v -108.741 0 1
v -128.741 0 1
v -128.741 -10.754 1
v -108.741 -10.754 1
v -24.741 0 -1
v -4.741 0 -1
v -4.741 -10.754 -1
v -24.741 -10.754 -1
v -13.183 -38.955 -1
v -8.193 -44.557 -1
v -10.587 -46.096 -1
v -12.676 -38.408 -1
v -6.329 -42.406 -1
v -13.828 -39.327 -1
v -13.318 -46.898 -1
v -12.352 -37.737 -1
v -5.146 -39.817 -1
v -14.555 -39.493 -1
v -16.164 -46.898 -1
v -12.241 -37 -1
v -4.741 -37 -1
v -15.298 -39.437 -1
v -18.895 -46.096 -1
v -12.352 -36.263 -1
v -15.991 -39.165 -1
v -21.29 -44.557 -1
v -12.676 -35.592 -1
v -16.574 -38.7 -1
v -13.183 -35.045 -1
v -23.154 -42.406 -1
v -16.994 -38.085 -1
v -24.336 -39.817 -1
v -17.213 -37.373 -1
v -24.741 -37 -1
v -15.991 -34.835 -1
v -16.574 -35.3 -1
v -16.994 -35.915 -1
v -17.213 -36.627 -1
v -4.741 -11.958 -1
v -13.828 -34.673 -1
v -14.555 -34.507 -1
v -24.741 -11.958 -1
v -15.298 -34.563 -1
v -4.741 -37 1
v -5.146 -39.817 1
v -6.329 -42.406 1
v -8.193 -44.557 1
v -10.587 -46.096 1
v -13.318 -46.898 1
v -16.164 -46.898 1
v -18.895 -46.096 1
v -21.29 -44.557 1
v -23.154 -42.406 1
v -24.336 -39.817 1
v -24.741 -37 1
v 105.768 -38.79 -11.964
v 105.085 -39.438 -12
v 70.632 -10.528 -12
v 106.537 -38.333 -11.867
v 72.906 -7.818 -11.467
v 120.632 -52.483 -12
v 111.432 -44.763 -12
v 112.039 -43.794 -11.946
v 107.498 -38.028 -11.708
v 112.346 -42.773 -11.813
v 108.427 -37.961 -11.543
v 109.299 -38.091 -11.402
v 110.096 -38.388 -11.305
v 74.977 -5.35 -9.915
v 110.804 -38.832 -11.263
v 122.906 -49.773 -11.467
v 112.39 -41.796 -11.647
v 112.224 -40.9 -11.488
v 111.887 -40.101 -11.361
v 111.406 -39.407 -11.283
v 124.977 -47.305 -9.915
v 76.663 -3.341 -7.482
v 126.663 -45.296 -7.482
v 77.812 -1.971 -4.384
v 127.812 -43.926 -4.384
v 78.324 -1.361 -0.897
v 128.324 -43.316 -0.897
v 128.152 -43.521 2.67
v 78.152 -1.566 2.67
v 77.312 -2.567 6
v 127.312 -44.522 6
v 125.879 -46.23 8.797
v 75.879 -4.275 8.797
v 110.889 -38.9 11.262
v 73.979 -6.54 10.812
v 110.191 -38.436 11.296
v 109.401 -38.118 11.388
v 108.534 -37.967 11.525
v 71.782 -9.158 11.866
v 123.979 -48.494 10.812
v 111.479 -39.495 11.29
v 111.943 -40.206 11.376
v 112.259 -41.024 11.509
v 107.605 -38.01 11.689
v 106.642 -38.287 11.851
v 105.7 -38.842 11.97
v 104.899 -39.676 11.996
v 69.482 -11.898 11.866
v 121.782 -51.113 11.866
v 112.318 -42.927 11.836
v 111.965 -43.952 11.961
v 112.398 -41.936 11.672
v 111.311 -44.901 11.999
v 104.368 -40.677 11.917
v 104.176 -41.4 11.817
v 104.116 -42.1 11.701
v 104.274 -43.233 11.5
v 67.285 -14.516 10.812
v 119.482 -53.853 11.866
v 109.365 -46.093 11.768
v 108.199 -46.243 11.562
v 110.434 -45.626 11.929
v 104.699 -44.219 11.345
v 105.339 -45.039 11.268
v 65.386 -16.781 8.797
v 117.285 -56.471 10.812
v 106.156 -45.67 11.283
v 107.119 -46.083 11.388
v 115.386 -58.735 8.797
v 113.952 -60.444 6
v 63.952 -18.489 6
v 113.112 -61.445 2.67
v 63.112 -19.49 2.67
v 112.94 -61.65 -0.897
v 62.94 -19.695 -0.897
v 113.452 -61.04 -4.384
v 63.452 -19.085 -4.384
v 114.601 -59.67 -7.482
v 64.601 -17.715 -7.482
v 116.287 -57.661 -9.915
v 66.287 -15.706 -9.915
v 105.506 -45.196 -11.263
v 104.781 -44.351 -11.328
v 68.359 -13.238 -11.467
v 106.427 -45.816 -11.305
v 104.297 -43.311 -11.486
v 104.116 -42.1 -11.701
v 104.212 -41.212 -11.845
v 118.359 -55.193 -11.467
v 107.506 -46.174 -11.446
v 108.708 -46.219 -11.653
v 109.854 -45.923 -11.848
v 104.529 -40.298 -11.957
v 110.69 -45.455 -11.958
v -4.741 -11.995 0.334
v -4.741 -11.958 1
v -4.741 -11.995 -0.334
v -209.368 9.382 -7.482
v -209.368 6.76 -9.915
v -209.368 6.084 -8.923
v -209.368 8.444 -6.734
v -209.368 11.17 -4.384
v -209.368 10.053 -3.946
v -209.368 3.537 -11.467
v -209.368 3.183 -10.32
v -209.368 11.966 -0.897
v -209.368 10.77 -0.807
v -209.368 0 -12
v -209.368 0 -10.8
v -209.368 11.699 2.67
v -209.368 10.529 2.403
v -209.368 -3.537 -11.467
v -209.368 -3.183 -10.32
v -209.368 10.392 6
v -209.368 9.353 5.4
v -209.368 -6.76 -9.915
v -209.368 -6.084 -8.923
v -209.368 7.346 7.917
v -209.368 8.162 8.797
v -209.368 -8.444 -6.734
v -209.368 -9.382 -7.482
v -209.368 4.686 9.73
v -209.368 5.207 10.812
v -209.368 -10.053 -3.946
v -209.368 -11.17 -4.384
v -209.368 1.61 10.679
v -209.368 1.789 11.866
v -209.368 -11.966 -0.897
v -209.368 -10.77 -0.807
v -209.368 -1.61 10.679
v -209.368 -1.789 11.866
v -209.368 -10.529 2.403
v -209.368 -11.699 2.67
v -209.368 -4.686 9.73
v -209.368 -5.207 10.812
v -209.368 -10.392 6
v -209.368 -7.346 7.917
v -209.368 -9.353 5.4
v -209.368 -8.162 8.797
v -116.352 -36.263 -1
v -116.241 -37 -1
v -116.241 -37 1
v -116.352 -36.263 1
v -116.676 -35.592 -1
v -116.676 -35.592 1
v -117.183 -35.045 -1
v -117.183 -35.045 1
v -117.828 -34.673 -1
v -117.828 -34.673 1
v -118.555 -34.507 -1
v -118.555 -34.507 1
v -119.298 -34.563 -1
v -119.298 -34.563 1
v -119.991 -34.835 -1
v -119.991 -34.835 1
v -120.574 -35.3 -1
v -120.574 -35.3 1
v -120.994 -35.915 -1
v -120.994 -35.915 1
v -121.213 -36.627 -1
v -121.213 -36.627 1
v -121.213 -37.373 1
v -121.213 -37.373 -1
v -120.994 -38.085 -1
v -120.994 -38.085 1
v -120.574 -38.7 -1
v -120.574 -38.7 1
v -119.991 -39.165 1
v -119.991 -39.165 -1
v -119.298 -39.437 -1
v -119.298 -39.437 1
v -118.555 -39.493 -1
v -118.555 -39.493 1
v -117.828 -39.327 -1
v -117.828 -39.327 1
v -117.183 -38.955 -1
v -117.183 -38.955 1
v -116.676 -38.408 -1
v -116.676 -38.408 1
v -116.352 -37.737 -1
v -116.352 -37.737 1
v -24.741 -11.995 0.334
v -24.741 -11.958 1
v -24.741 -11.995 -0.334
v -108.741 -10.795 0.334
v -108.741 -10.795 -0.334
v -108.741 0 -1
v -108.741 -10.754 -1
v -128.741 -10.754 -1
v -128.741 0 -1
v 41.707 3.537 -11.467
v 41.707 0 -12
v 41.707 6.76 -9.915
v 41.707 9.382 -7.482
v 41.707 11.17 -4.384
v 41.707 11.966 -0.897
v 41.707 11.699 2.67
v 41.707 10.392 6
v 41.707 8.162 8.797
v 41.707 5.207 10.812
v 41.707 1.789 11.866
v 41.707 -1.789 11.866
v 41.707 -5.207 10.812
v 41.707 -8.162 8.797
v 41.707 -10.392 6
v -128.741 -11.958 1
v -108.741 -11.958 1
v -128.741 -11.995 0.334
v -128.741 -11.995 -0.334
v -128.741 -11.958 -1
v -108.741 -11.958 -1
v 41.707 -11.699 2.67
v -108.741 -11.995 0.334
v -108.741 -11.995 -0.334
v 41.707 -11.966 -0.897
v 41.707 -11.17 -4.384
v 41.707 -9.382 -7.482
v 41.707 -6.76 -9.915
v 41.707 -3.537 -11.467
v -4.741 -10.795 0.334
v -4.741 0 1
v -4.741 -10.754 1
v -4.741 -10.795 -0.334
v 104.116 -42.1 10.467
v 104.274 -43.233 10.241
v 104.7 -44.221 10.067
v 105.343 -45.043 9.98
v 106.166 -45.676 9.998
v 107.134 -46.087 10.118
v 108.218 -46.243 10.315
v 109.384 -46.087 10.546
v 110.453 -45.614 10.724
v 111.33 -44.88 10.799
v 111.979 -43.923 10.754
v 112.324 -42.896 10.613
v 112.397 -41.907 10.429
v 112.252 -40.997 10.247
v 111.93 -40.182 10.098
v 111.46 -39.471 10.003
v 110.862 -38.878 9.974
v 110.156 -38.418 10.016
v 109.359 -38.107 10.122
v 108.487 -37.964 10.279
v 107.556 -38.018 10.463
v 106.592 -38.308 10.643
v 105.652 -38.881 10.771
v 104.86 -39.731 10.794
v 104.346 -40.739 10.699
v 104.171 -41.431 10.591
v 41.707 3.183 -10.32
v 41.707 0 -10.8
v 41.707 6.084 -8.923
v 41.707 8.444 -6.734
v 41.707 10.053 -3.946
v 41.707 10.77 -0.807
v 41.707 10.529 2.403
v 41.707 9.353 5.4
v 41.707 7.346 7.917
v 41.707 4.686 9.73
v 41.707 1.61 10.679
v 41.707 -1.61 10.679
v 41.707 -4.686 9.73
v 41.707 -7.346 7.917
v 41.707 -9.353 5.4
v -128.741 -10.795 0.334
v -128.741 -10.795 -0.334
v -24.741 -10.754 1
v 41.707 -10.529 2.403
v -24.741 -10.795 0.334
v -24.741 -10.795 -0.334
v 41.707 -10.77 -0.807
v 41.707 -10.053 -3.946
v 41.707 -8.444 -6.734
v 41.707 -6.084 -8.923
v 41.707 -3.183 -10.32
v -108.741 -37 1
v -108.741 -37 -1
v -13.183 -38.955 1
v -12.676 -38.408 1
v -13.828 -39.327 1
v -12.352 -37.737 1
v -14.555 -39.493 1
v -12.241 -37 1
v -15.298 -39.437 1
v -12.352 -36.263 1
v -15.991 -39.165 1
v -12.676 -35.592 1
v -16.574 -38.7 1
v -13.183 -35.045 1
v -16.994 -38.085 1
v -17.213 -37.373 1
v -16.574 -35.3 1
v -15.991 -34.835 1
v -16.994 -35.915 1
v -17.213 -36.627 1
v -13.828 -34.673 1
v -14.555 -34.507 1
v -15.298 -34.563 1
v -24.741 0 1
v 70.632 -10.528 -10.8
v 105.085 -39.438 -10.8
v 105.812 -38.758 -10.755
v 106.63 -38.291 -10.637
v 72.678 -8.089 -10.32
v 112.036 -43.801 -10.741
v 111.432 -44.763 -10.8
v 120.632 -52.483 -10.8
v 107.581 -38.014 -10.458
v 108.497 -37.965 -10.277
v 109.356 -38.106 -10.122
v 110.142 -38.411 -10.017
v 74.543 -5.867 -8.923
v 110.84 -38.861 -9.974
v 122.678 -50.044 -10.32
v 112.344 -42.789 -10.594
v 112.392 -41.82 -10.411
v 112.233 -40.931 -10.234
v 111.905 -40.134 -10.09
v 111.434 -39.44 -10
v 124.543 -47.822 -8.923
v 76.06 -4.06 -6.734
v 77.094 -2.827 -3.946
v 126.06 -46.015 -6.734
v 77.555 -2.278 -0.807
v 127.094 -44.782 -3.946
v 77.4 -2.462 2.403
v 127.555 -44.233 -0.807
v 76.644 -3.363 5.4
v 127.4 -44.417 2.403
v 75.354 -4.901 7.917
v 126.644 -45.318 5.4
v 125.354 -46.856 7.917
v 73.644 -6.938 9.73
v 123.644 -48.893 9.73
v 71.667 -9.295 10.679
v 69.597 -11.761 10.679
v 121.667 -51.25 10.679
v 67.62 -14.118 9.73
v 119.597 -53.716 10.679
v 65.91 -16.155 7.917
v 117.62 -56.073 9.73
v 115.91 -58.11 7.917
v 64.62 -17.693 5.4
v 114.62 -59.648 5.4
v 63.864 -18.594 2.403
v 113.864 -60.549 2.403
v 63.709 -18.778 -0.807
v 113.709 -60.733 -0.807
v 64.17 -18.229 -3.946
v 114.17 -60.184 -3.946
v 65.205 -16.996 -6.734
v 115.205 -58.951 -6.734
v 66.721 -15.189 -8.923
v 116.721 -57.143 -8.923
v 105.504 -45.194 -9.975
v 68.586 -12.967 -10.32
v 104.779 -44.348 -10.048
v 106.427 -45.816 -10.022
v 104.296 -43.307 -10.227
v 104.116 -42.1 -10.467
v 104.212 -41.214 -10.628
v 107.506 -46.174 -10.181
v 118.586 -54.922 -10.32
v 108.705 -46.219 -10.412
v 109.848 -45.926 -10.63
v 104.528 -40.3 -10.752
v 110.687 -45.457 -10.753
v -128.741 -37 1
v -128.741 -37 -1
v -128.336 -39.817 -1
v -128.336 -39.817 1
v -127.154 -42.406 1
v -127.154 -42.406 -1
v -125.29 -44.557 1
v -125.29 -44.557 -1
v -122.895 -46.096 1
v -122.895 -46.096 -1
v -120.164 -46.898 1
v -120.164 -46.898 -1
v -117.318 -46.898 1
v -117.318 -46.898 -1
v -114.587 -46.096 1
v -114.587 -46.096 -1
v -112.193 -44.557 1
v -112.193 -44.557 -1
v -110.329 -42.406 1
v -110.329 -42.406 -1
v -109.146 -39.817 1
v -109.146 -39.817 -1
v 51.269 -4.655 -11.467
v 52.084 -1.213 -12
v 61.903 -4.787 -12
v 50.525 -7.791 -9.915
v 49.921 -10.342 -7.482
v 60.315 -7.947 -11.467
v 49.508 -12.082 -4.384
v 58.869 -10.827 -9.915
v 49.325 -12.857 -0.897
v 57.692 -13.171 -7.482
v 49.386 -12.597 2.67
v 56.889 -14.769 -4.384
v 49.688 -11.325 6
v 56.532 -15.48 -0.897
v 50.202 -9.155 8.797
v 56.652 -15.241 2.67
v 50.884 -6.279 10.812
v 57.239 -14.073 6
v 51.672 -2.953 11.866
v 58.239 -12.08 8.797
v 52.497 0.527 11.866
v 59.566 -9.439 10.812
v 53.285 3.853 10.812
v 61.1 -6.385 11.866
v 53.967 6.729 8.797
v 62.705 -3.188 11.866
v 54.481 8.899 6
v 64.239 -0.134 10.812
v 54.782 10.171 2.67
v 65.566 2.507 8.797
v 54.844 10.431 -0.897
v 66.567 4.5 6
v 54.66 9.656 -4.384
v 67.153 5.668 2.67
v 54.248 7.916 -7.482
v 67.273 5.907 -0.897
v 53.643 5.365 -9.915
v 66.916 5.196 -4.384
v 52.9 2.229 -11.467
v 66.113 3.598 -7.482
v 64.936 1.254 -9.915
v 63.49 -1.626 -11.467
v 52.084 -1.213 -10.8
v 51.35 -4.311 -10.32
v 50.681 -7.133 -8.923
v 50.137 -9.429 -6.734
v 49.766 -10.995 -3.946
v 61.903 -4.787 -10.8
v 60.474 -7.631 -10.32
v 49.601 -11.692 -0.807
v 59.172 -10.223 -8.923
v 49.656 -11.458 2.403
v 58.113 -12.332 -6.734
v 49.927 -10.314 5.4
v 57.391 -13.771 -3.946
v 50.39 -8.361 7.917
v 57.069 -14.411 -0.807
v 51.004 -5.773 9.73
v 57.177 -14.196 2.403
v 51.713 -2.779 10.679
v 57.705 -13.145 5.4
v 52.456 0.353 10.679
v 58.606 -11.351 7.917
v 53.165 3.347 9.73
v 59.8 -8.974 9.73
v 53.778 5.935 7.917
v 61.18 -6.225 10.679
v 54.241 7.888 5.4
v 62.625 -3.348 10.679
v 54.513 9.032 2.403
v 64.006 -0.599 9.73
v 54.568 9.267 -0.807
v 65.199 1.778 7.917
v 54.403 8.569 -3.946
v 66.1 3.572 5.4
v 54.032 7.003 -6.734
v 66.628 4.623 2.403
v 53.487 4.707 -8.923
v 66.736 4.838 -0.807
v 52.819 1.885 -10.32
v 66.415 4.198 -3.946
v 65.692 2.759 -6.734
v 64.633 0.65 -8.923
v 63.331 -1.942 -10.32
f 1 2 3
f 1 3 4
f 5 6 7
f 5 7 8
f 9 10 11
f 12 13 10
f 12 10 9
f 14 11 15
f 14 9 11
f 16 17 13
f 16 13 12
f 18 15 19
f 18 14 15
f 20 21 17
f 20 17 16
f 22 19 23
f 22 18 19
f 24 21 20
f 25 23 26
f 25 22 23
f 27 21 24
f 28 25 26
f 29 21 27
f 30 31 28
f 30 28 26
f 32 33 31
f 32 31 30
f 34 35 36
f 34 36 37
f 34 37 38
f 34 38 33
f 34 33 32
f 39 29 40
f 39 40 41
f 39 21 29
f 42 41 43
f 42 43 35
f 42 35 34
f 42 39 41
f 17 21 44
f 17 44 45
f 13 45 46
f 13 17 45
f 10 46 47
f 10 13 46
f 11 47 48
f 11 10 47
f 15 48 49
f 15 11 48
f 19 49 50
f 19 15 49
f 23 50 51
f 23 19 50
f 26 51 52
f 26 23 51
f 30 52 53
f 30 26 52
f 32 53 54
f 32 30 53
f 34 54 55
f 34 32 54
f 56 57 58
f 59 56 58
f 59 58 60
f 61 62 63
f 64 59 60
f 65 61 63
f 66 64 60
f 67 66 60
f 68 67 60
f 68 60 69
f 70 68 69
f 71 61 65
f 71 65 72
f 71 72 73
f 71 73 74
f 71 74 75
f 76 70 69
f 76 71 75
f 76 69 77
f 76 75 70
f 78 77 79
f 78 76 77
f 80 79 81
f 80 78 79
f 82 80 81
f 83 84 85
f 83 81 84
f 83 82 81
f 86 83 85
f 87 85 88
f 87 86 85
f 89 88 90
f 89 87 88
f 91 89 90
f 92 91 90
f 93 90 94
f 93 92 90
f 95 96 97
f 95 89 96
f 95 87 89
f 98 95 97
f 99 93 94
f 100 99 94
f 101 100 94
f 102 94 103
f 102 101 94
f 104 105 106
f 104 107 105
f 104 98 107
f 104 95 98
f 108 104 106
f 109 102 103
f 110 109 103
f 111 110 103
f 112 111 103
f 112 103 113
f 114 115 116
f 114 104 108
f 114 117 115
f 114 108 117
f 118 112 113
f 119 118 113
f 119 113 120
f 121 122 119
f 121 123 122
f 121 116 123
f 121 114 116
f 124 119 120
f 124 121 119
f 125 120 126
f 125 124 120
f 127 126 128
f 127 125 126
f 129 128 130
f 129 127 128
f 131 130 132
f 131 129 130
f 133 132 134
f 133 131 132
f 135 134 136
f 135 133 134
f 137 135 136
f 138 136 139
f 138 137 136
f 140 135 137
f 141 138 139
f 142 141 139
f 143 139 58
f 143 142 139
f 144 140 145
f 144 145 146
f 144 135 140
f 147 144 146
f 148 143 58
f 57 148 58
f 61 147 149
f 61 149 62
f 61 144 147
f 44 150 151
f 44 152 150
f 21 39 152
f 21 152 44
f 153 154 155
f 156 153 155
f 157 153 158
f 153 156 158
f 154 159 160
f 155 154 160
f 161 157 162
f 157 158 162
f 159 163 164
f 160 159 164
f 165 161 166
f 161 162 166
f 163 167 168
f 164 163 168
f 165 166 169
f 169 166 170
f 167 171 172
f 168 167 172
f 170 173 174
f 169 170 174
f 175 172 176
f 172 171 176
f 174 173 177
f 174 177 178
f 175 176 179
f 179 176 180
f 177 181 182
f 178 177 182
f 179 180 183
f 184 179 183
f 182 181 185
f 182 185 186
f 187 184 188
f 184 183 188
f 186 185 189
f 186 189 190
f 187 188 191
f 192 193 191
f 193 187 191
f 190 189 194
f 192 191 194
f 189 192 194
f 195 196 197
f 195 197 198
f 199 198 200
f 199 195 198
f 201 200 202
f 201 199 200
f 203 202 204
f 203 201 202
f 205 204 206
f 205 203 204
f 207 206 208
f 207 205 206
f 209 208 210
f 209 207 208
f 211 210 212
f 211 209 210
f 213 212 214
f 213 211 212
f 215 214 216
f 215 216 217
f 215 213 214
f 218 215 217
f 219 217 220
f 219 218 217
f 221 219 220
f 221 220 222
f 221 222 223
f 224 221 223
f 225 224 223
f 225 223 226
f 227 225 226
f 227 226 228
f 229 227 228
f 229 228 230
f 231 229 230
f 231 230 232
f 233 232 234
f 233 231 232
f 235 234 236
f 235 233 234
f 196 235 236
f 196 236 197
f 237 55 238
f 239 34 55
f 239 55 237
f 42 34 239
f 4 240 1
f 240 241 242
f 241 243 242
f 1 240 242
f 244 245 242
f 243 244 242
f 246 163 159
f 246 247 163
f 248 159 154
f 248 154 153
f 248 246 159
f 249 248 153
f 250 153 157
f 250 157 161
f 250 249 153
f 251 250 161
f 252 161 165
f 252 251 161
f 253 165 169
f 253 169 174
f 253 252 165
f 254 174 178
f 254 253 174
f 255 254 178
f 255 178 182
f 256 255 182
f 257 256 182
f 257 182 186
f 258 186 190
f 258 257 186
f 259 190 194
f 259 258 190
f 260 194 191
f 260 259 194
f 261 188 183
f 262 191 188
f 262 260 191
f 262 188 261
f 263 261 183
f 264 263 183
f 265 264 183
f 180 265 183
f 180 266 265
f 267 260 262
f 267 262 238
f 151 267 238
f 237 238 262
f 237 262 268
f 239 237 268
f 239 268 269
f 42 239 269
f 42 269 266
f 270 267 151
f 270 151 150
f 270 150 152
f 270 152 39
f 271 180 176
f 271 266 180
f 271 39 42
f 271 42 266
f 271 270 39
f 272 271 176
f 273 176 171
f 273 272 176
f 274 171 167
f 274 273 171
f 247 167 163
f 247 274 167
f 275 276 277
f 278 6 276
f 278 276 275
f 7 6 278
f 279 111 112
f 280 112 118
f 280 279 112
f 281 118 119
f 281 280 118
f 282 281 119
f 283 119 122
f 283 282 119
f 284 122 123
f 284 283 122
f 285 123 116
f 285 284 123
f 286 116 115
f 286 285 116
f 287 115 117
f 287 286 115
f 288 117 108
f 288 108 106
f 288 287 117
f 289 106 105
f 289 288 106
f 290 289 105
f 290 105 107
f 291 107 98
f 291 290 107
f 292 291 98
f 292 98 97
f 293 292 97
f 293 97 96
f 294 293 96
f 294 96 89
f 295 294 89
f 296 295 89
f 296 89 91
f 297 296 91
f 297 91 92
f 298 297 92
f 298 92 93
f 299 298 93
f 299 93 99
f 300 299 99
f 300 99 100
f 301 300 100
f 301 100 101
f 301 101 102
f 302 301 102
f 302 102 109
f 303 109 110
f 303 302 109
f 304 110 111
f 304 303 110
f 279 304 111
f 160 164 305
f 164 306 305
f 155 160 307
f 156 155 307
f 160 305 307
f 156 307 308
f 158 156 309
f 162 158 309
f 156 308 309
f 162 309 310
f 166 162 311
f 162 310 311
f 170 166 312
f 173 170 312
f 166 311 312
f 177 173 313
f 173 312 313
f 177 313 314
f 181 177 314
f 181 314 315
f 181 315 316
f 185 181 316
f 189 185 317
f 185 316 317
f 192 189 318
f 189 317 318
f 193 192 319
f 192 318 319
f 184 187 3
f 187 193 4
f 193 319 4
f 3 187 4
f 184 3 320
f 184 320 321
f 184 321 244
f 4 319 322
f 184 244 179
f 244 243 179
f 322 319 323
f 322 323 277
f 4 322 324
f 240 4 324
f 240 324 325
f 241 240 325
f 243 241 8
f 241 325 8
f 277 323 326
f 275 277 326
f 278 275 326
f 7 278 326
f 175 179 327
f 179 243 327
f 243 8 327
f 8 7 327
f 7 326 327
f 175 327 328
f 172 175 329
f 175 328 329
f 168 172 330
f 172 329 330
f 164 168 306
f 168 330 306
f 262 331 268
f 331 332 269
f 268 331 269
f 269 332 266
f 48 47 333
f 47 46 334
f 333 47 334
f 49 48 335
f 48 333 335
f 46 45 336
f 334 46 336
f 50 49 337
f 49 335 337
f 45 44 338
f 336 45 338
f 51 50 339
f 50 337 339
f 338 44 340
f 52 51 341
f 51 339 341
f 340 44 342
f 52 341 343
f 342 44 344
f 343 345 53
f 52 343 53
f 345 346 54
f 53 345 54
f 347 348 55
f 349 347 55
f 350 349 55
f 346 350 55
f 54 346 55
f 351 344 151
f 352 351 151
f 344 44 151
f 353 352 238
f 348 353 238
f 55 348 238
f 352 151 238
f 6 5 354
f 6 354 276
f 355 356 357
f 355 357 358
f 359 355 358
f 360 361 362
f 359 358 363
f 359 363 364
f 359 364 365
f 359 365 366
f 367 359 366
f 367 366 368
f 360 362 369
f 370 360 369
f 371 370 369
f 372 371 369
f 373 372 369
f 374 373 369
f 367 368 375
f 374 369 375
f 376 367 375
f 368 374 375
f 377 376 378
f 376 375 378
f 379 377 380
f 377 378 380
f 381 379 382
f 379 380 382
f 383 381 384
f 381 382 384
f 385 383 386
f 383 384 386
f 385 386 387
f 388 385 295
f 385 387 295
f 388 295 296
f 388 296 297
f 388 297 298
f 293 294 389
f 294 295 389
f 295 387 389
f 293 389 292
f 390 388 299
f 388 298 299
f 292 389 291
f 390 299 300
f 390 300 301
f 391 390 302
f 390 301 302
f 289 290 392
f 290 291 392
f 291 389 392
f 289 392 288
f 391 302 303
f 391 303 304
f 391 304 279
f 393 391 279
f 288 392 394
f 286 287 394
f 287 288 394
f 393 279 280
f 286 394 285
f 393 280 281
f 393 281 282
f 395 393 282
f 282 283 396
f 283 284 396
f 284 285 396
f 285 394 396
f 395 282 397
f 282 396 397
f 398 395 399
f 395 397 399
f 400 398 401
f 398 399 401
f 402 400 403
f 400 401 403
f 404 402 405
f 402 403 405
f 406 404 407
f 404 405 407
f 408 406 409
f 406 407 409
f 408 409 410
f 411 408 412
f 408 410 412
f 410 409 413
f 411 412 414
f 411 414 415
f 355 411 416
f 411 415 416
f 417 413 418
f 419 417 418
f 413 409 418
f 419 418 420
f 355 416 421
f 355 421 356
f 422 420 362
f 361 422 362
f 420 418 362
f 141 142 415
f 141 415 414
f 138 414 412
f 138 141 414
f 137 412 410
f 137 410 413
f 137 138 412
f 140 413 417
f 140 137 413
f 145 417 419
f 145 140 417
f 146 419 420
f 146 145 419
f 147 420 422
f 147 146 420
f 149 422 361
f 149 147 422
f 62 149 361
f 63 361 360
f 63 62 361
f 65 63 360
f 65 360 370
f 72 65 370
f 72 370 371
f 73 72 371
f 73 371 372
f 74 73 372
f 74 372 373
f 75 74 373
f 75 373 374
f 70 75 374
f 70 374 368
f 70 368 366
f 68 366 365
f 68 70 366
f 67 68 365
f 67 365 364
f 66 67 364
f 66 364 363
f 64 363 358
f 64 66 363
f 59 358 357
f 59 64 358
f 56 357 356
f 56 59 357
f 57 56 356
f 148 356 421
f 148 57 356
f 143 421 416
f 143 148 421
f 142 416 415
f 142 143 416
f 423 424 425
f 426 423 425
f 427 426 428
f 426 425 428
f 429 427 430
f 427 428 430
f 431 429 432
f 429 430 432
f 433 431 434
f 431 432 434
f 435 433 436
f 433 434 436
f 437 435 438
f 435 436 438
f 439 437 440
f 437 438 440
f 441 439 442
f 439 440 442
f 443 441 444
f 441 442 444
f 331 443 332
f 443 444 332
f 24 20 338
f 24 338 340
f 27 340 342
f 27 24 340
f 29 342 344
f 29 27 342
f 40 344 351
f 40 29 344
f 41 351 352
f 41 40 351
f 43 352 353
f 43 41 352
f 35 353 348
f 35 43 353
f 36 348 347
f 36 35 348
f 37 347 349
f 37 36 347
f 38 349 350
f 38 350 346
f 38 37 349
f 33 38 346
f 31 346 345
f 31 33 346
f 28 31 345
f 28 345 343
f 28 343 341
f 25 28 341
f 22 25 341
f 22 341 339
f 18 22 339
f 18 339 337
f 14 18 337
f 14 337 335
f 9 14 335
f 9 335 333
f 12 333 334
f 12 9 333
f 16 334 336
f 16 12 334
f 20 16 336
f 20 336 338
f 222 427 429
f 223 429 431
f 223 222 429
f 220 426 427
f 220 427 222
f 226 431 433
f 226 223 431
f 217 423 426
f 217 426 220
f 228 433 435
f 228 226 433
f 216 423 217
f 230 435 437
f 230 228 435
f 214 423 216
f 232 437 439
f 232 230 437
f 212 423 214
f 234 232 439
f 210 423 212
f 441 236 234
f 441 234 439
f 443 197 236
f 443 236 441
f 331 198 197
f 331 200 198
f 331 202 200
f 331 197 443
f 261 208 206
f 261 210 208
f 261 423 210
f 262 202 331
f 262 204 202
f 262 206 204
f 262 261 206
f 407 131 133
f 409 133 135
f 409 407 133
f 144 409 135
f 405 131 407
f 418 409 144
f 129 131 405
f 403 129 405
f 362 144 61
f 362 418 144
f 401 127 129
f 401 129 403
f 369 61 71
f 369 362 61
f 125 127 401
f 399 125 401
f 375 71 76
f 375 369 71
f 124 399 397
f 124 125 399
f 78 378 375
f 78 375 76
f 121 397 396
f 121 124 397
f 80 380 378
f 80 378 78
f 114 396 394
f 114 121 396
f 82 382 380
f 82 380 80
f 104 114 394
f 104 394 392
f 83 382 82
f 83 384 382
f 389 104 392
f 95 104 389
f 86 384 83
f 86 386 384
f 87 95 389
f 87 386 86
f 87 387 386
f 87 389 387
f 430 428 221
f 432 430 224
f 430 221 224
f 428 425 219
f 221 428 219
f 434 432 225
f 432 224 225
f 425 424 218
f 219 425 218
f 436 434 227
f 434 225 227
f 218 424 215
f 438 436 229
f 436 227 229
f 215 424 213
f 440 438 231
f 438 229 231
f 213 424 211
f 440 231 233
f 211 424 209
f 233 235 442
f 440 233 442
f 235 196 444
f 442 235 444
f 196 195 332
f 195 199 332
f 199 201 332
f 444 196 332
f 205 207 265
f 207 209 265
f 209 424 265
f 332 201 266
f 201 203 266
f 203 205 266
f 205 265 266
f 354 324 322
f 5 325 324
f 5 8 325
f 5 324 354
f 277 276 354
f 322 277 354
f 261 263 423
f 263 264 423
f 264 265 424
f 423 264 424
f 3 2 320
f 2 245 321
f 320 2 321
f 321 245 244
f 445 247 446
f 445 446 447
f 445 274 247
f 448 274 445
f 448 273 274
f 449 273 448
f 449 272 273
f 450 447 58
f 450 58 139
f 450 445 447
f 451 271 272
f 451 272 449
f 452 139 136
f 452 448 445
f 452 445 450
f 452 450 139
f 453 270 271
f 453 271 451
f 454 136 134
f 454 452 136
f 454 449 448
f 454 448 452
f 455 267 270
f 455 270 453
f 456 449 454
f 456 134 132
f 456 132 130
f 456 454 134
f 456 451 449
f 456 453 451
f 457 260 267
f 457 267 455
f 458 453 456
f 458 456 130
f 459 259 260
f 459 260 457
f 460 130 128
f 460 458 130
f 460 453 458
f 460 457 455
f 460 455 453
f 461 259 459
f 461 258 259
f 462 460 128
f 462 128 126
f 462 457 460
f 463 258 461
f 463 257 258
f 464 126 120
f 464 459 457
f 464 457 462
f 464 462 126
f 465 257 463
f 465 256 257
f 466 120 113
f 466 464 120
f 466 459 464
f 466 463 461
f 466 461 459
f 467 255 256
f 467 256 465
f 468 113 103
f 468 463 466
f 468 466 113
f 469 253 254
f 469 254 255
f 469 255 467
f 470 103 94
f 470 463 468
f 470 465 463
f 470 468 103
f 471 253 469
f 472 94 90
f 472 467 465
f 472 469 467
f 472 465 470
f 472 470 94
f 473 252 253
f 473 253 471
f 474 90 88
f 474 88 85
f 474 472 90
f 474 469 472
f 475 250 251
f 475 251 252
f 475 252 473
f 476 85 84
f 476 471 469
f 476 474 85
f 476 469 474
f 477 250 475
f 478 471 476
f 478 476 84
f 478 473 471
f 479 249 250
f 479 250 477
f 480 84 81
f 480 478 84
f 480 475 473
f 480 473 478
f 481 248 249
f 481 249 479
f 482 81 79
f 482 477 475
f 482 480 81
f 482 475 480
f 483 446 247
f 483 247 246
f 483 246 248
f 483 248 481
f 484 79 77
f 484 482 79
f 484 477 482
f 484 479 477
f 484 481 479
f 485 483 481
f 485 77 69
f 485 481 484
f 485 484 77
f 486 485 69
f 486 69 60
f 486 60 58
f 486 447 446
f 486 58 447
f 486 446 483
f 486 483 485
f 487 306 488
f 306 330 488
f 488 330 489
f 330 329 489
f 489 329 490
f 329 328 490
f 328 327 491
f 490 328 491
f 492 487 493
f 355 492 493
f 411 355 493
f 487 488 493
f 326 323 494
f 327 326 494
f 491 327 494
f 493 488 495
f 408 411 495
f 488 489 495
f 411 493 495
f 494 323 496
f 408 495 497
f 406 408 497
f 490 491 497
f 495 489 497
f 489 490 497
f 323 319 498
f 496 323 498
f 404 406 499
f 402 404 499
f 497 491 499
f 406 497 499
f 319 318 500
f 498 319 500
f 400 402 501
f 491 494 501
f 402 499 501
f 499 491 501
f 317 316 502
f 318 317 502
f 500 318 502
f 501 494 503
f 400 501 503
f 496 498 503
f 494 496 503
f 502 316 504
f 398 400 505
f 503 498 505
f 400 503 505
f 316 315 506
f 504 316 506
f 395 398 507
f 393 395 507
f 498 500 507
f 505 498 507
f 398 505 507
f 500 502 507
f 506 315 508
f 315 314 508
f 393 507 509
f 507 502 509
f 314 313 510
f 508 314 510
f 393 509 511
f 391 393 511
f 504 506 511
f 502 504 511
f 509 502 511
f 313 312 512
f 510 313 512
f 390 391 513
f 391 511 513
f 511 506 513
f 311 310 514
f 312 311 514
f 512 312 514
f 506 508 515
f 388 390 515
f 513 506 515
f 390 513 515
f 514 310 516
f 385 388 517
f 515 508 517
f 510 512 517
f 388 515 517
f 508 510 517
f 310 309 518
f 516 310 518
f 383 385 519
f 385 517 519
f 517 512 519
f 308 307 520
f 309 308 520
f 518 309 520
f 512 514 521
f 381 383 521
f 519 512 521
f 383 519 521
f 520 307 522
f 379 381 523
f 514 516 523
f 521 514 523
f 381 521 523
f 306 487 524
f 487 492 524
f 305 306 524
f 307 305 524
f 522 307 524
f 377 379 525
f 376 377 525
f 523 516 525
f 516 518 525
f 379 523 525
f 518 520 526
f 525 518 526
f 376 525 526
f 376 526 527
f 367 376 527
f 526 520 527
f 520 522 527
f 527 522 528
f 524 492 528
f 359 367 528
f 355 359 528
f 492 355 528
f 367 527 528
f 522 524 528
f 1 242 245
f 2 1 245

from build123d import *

# Parameters (mm, degrees)
SKETCH2_R                = 12
SKETCH2_R_2              = 10.8
CUT_EXTRUDE1_DEPTH       = 20
CUT_EXTRUDE1_DEPTH_BACK  = 20
SKETCH3_R                = 4.14257131
BOSS_EXTRUDE1_DEPTH      = 1
BOSS_EXTRUDE1_DEPTH_BACK = 1
SKETCH4_R                = 2.5


with BuildPart() as part:
    # Sweep1: sweep along a path in Sketch1
    with BuildLine(Plane.XY) as sweep1_path:
        Line((-209.367896725, 0), (41.706660839, 0))
        ThreePointArc((41.706660839, 0), (57.097567289, -2.713832065), (70.632103275, -10.52800006))
        Line((70.632103275, -10.52800006), (120.632103275, -52.482981619))
    # Sketch2 → Sweep1 (sweep)
    with BuildSketch(Plane(origin=(-209.367896725, 0, 0), x_dir=(0, 0, -1), z_dir=(1, 0, 0))):
        Circle(SKETCH2_R)
        Circle(SKETCH2_R_2, mode=Mode.SUBTRACT)
    sweep(path=sweep1_path.line)

    # Sketch3 → Cut-Extrude1 (cut, two sides: drawn at the far end of the back side and taken through both)
    with BuildSketch(Plane.XY.offset(-CUT_EXTRUDE1_DEPTH_BACK)):
        with Locations((108.258660408, -42.100430272)):
            Circle(SKETCH3_R)
    extrude(amount=CUT_EXTRUDE1_DEPTH + CUT_EXTRUDE1_DEPTH_BACK, mode=Mode.SUBTRACT)

    # Sketch4 → Boss-Extrude1 (add, two sides: drawn at the far end of the back side and taken through both)
    # profile 1 of 2: a face of its own
    with BuildSketch(Plane.XY.offset(-BOSS_EXTRUDE1_DEPTH_BACK)):
        with BuildLine():
            Line((-128.741339592, 0), (-128.741339592, -37))
            ThreePointArc((-128.741339592, -37), (-118.741339592, -47), (-108.741339592, -37))
            Line((-108.741339592, -37), (-108.741339592, 0))
            Line((-108.741339592, 0), (-128.741339592, 0))
        make_face()
        with Locations((-118.741339592, -37)):
            Circle(SKETCH4_R, mode=Mode.SUBTRACT)
    # profile 2 of 2: a face of its own
    with BuildSketch(Plane.XY.offset(-BOSS_EXTRUDE1_DEPTH_BACK)):
        with BuildLine():
            Line((-24.741339592, 0), (-4.741339592, 0))
            Line((-4.741339592, 0), (-4.741339592, -37))
            ThreePointArc((-4.741339592, -37), (-14.741339592, -47), (-24.741339592, -37))
            Line((-24.741339592, -37), (-24.741339592, 0))
        make_face()
        with Locations((-14.741339592, -37)):
            Circle(SKETCH4_R, mode=Mode.SUBTRACT)
    extrude(amount=BOSS_EXTRUDE1_DEPTH + BOSS_EXTRUDE1_DEPTH_BACK)


solid = part.part
